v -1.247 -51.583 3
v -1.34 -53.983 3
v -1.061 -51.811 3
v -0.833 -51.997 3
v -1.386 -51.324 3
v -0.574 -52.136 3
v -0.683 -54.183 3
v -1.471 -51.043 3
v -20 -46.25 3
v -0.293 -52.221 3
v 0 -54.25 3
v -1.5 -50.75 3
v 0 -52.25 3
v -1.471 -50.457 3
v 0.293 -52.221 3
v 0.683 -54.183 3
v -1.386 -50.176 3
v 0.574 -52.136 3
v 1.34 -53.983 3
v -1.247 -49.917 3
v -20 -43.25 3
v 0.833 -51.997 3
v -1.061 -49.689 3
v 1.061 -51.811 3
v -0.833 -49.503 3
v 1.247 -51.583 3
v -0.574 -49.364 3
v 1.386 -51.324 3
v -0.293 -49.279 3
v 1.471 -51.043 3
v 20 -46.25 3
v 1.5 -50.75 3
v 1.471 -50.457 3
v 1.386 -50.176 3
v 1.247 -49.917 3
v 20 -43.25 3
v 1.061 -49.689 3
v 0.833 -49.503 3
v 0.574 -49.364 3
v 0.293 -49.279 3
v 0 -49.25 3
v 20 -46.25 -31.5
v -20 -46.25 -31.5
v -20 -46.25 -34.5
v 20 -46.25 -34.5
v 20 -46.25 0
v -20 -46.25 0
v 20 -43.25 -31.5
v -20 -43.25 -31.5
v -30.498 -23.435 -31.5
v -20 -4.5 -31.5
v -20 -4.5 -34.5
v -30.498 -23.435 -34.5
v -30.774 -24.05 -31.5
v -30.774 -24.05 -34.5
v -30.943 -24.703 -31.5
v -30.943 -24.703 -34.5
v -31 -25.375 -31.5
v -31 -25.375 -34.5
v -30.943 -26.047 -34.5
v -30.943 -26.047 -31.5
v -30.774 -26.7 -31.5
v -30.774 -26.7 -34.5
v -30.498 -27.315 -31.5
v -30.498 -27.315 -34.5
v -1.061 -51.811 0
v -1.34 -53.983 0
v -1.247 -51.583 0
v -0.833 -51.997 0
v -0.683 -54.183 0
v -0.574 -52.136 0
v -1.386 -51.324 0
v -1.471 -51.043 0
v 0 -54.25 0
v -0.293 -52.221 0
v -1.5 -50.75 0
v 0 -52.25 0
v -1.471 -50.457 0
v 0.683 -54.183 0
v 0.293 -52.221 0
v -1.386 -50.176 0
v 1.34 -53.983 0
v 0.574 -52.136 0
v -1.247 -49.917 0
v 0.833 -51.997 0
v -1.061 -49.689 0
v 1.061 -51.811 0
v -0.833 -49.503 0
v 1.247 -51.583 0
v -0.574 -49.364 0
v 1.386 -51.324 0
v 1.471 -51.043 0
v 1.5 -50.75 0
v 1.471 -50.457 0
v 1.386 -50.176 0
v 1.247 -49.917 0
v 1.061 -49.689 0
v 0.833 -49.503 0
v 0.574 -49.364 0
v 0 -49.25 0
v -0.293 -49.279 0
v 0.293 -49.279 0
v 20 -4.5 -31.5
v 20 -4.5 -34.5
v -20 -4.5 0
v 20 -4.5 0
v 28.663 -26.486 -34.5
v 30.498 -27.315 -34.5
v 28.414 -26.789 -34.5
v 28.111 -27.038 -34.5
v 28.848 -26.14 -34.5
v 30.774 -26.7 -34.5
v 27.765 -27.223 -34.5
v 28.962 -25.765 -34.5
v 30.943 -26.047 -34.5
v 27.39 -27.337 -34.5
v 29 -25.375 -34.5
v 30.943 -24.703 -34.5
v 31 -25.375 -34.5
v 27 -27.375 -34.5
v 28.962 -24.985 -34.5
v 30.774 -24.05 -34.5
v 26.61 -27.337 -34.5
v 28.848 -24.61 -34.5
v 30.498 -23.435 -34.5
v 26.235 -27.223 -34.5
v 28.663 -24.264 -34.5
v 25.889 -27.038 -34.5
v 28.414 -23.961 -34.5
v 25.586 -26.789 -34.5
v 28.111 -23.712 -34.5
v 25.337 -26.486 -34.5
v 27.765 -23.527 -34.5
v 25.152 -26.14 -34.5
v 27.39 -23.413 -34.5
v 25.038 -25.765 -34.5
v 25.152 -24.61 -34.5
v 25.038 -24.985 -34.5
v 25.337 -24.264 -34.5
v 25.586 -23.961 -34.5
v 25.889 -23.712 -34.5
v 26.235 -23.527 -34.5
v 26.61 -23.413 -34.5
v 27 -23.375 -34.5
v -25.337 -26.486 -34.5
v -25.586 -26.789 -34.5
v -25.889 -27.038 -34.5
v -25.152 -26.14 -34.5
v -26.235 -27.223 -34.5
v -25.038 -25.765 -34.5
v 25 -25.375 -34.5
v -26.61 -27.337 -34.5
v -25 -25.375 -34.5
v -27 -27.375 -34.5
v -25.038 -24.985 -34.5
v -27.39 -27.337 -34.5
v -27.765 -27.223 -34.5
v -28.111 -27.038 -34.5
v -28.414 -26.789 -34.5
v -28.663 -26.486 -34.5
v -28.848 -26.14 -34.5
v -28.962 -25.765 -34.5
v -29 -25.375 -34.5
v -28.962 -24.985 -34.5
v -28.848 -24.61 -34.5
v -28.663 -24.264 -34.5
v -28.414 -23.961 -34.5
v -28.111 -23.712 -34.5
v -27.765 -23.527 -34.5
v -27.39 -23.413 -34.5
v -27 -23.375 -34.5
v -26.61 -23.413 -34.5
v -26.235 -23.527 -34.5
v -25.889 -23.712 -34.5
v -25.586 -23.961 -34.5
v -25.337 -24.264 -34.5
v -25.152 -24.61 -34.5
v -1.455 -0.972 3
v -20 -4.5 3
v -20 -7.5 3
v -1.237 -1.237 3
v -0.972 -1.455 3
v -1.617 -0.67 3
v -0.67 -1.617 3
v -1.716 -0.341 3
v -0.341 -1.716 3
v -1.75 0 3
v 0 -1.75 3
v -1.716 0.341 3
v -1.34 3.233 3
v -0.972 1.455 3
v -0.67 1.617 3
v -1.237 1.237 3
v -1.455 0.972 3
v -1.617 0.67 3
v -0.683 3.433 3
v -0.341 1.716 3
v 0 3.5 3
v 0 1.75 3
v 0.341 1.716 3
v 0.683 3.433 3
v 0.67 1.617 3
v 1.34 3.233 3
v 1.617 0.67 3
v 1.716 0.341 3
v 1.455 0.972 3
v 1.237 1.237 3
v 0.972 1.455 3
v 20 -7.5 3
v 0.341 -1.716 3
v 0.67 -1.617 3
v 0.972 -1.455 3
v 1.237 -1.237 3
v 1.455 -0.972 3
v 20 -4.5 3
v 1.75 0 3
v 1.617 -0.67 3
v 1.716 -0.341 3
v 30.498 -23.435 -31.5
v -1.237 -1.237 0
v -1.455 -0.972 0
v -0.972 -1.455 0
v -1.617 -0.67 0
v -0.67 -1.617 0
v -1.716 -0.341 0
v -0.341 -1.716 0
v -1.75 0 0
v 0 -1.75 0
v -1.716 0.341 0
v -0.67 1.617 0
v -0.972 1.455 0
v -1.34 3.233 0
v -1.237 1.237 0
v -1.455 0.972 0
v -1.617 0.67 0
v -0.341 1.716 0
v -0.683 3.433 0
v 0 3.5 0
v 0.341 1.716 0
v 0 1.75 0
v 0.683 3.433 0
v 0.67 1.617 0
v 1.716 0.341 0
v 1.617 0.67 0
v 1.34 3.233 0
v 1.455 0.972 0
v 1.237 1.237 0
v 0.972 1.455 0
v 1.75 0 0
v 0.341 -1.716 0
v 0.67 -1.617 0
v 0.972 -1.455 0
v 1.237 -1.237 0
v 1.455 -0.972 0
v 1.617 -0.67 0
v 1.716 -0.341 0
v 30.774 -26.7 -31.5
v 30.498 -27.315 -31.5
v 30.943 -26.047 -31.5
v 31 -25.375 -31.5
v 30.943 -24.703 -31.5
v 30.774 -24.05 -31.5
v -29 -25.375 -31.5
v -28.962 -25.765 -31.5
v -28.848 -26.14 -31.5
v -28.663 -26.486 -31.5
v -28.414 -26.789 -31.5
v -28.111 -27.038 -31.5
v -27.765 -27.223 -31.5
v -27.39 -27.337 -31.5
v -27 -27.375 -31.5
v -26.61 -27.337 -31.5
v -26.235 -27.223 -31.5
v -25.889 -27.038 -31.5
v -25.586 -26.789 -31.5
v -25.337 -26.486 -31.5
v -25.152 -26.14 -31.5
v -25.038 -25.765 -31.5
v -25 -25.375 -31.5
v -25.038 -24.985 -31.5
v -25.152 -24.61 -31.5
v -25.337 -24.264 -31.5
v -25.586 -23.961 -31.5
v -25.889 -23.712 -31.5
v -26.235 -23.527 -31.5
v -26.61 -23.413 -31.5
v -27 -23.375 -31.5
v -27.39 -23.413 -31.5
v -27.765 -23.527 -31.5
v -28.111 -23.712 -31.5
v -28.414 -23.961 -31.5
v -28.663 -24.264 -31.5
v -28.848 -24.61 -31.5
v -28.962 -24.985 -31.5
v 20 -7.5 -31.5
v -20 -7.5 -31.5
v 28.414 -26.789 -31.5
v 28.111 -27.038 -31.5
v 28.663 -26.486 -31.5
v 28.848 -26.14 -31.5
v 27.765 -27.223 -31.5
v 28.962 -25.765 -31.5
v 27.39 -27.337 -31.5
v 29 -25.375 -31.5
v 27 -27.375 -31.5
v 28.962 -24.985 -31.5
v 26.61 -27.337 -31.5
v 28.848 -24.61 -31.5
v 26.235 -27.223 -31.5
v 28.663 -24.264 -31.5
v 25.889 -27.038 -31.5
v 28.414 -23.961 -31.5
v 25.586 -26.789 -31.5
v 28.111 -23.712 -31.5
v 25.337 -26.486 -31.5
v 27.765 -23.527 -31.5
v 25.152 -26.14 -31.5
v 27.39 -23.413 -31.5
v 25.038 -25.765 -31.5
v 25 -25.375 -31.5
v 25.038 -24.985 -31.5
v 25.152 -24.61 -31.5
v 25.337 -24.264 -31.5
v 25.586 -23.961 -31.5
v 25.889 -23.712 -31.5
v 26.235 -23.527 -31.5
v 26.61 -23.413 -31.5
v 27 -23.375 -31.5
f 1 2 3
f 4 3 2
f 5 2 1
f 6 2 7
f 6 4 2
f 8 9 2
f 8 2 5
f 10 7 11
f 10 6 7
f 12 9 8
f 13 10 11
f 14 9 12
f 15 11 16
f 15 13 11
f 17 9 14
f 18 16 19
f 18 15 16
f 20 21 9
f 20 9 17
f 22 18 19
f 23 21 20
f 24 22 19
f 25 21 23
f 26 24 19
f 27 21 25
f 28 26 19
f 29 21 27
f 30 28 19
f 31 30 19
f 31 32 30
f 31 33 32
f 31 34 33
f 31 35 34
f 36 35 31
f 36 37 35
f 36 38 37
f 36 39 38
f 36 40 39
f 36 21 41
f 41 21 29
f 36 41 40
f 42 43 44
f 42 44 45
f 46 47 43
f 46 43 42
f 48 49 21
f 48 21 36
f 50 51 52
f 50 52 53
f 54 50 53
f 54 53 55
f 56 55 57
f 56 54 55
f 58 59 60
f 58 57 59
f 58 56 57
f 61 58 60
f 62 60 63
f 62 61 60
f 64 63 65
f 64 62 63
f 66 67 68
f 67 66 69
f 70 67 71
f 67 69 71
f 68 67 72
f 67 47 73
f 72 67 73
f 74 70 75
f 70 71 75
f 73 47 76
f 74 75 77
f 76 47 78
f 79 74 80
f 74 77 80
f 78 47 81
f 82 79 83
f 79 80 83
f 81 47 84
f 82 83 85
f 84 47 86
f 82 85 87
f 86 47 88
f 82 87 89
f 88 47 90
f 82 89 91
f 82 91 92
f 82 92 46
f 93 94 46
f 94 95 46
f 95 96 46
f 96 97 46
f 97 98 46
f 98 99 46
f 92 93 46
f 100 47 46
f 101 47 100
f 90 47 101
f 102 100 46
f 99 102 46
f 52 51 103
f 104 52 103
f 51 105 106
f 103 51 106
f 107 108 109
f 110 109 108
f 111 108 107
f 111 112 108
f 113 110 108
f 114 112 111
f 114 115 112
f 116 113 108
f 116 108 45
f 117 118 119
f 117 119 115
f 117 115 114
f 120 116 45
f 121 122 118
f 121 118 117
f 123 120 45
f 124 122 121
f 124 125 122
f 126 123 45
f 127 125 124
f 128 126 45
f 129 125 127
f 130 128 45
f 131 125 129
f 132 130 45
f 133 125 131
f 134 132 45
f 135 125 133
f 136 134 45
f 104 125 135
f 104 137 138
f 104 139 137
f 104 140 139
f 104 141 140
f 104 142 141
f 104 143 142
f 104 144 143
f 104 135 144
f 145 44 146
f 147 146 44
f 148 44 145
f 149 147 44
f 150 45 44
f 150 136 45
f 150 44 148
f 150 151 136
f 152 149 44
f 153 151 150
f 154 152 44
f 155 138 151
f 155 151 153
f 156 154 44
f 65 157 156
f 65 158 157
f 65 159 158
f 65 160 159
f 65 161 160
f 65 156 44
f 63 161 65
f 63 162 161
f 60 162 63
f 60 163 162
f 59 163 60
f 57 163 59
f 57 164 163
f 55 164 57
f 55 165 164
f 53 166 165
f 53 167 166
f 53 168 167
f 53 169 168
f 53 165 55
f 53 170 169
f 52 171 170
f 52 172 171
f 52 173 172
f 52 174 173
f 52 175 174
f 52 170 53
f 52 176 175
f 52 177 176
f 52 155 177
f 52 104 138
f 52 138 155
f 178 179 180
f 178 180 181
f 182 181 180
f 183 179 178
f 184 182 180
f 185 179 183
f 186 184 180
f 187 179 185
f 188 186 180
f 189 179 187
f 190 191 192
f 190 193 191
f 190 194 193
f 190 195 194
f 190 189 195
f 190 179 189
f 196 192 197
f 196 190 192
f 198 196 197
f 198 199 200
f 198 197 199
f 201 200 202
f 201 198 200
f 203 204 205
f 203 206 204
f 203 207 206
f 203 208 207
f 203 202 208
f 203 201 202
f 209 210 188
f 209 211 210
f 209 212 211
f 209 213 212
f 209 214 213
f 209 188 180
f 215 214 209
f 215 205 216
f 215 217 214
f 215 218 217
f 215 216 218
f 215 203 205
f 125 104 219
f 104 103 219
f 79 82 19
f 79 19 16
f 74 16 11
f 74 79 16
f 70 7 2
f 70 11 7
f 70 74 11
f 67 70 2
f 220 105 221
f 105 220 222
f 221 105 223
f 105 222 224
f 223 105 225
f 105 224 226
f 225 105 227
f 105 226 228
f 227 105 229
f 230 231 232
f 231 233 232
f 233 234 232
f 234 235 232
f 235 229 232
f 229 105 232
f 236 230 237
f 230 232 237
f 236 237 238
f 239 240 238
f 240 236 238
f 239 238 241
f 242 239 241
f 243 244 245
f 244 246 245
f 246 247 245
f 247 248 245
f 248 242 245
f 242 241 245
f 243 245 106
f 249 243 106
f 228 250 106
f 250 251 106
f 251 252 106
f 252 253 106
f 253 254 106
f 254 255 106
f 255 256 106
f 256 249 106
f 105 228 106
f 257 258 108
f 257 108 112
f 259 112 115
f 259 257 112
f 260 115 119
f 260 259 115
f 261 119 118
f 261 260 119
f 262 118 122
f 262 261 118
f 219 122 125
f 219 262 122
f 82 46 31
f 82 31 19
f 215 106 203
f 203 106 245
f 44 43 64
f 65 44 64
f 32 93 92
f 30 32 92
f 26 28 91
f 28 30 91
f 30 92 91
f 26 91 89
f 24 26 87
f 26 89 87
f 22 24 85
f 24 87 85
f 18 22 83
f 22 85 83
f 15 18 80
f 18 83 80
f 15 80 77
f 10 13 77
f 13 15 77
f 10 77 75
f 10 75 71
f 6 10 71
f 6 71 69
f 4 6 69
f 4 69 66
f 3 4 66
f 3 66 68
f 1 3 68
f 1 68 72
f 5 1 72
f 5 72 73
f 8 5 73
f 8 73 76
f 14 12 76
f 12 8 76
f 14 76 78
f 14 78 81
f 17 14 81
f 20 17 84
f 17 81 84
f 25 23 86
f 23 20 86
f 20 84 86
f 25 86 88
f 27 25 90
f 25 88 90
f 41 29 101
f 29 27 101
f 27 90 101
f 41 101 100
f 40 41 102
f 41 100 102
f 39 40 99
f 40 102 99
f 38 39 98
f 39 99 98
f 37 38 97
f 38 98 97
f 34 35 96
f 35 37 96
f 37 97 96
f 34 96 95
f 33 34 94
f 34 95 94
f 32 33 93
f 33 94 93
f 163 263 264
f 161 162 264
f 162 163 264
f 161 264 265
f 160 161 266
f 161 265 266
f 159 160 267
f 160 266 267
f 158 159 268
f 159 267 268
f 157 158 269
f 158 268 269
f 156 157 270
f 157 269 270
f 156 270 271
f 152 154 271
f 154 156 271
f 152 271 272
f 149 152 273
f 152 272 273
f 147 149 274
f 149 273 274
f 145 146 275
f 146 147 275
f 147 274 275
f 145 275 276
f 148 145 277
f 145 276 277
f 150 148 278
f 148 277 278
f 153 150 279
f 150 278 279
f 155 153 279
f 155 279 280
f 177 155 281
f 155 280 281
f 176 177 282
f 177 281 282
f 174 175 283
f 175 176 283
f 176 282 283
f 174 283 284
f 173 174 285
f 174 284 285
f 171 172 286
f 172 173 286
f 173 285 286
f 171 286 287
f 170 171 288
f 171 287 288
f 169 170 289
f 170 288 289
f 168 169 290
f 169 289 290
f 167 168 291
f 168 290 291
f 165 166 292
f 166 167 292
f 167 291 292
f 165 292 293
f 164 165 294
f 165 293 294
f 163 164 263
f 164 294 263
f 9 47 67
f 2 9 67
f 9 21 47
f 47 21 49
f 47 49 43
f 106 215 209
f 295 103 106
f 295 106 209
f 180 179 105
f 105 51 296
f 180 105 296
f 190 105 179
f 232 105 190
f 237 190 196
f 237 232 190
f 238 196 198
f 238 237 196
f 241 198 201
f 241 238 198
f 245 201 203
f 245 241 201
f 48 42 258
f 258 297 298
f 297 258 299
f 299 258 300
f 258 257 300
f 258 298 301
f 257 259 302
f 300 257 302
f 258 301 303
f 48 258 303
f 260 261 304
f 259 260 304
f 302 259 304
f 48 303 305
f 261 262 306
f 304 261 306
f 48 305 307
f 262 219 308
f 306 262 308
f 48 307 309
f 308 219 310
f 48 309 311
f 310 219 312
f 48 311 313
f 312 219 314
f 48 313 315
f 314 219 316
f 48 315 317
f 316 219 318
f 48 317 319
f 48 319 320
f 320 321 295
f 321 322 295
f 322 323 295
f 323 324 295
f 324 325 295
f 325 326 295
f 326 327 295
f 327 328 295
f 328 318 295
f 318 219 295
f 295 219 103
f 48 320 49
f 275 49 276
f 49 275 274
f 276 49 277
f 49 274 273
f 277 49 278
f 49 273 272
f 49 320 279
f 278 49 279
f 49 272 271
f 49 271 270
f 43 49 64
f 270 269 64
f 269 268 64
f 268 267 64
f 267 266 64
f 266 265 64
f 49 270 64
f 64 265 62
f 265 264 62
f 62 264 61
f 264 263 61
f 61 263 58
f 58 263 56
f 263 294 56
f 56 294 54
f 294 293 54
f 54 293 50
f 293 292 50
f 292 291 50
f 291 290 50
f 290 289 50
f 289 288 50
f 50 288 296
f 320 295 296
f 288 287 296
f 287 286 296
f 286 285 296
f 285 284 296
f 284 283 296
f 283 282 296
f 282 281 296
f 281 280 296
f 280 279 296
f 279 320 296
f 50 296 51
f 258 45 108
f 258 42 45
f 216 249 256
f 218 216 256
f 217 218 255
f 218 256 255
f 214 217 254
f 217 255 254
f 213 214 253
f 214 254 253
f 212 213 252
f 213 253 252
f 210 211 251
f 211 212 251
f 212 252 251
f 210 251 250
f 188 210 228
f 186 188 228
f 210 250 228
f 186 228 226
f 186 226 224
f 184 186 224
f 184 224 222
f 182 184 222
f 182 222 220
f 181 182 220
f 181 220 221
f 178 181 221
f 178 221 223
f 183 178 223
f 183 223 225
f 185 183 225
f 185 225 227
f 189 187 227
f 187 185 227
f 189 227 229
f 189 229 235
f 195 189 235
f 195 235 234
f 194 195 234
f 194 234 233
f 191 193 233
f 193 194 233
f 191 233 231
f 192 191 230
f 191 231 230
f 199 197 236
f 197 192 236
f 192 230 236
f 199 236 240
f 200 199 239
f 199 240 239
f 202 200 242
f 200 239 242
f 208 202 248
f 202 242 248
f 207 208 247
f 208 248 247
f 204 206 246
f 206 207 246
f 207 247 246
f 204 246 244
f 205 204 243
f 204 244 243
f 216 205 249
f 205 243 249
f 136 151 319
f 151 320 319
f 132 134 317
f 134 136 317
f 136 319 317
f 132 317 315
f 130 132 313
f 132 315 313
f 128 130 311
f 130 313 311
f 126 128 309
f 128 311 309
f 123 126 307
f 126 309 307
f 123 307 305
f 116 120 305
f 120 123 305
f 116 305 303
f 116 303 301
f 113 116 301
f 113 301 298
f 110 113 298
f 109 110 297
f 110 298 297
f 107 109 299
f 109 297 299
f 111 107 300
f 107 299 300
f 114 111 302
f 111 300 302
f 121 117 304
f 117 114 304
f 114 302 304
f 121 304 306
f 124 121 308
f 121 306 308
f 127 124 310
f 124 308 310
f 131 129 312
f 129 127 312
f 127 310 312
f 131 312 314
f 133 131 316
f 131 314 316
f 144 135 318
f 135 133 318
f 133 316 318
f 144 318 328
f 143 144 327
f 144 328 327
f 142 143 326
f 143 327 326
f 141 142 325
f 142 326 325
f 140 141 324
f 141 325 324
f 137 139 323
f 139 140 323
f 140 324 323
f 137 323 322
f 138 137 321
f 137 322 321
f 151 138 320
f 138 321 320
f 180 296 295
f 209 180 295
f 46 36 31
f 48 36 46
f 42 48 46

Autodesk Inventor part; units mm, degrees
ref_plane "YZ Plane" through (0, 0, 0) normal (1, 0, 0) x (0, 1, 0)
ref_plane "XZ Plane" through (0, 0, 0) normal (0, 1, 0) x (-1, 0, 0)
ref_plane "XY Plane" through (0, 0, 0) normal (0, 0, 1) x (1, 0, 0)
sketch "Sketch1" plane through (0, 0, 0) normal (0, 0, 1) x (1, 0, 0)
  circle A0 centre (0, 0) radius 1.75
  line L0 (0, 0) -> (0, -50.75)
  circle A1 centre (0, -50.75) radius 1.5
  line L1 (0, 0) -> (0, -7.5)
  line L2 (0, -7.5) -> (0, -4.5)
  line L3 (-20, -7.5) -> (20, -7.5)
  line L4 (-20, -4.5) -> (20, -4.5)
  circle A2 centre (0, 0) radius 3.5
  line L5 (-20, -4.5) -> (-1.34, 3.2333)
  line L6 (20, -4.5) -> (1.34, 3.2333)
  line L7 (-20, -4.5) -> (-20, -7.5)
  line L8 (20, -4.5) -> (20, -7.5)
  line L9 (0, -50.75) -> (0, -43.25)
  line L10 (0, -43.25) -> (0, -46.25)
  line L11 (-20, -43.25) -> (20, -43.25)
  line L12 (-20, -46.25) -> (20, -46.25)
  circle A3 centre (0, -50.75) radius 3.5
  line L13 (-20, -43.25) -> (-20, -46.25)
  line L14 (-20, -46.25) -> (-1.34, -53.9833)
  line L15 (20, -43.25) -> (20, -46.25)
  line L16 (20, -46.25) -> (1.34, -53.9833)
  dimension "d0" = 3.5
  dimension "d1" = 50.75
  dimension "d2" = 3
  dimension "d3" = 7.5
  dimension "d4" = 3
  dimension "d5" = 40
  dimension "d6" = 40
  dimension "d7" = 7
  dimension "d8" = 7.5
  dimension "d9" = 3
  dimension "d10" = 40
  dimension "d11" = 40
  dimension "d12" = 7
extrude "Extrusion1" add sketch "Sketch1" along normal blind 3
extrude "Extrusion2" add sketch "Sketch1" against normal blind 31.5 contours L4 L8 L3 L0 | L0 L3 L7 L4 | L11 L15 L12 L0 | L0 L12 L13 L11
sketch "Sketch2" plane through (0, 0, -31.5) normal (0, 0, -1) x (-1, 0, 0)
  line L0 (-20, -7.5) -> (-20, -4.5) projected
  line L1 (-20, -4.5) -> (20, -4.5)
  line L2 (20, -4.5) -> (20, -46.25)
  line L3 (20, -46.25) -> (-20, -46.25)
  line L4 (-20, -46.25) -> (-20, -4.5)
  line L5 (20, -7.5) -> (-20, -7.5) projected
  line L6 (0, -7.5) -> (0, -25.375)
  line L7 (-20, -43.25) -> (20, -43.25) projected
  line L8 (-27, -25.375) -> (27, -25.375)
  circle A0 centre (-27, -25.375) radius 4
  circle A1 centre (-27, -25.375) radius 2
  circle A2 centre (27, -25.375) radius 4
  circle A3 centre (27, -25.375) radius 2
  line L9 (-20, -4.5) -> (-30.4983, -23.4354)
  line L10 (-1.34, -53.9833) -> (-20, -46.25) projected
  line L11 (-20, -46.25) -> (-30.4983, -27.3146)
  line L12 (20, -46.25) -> (30.4983, -27.3146)
  line L13 (20, -4.5) -> (30.4983, -23.4354)
  point P0 (0, 0)
  dimension "d17" = 17.875
  dimension "d18" = 54
  dimension "d19" = 8
  dimension "d20" = 4
  dimension "d21" = 8
  dimension "d22" = 4
extrude "Extrusion3" add sketch "Sketch2" along normal blind 3
properties part number "Mount"
